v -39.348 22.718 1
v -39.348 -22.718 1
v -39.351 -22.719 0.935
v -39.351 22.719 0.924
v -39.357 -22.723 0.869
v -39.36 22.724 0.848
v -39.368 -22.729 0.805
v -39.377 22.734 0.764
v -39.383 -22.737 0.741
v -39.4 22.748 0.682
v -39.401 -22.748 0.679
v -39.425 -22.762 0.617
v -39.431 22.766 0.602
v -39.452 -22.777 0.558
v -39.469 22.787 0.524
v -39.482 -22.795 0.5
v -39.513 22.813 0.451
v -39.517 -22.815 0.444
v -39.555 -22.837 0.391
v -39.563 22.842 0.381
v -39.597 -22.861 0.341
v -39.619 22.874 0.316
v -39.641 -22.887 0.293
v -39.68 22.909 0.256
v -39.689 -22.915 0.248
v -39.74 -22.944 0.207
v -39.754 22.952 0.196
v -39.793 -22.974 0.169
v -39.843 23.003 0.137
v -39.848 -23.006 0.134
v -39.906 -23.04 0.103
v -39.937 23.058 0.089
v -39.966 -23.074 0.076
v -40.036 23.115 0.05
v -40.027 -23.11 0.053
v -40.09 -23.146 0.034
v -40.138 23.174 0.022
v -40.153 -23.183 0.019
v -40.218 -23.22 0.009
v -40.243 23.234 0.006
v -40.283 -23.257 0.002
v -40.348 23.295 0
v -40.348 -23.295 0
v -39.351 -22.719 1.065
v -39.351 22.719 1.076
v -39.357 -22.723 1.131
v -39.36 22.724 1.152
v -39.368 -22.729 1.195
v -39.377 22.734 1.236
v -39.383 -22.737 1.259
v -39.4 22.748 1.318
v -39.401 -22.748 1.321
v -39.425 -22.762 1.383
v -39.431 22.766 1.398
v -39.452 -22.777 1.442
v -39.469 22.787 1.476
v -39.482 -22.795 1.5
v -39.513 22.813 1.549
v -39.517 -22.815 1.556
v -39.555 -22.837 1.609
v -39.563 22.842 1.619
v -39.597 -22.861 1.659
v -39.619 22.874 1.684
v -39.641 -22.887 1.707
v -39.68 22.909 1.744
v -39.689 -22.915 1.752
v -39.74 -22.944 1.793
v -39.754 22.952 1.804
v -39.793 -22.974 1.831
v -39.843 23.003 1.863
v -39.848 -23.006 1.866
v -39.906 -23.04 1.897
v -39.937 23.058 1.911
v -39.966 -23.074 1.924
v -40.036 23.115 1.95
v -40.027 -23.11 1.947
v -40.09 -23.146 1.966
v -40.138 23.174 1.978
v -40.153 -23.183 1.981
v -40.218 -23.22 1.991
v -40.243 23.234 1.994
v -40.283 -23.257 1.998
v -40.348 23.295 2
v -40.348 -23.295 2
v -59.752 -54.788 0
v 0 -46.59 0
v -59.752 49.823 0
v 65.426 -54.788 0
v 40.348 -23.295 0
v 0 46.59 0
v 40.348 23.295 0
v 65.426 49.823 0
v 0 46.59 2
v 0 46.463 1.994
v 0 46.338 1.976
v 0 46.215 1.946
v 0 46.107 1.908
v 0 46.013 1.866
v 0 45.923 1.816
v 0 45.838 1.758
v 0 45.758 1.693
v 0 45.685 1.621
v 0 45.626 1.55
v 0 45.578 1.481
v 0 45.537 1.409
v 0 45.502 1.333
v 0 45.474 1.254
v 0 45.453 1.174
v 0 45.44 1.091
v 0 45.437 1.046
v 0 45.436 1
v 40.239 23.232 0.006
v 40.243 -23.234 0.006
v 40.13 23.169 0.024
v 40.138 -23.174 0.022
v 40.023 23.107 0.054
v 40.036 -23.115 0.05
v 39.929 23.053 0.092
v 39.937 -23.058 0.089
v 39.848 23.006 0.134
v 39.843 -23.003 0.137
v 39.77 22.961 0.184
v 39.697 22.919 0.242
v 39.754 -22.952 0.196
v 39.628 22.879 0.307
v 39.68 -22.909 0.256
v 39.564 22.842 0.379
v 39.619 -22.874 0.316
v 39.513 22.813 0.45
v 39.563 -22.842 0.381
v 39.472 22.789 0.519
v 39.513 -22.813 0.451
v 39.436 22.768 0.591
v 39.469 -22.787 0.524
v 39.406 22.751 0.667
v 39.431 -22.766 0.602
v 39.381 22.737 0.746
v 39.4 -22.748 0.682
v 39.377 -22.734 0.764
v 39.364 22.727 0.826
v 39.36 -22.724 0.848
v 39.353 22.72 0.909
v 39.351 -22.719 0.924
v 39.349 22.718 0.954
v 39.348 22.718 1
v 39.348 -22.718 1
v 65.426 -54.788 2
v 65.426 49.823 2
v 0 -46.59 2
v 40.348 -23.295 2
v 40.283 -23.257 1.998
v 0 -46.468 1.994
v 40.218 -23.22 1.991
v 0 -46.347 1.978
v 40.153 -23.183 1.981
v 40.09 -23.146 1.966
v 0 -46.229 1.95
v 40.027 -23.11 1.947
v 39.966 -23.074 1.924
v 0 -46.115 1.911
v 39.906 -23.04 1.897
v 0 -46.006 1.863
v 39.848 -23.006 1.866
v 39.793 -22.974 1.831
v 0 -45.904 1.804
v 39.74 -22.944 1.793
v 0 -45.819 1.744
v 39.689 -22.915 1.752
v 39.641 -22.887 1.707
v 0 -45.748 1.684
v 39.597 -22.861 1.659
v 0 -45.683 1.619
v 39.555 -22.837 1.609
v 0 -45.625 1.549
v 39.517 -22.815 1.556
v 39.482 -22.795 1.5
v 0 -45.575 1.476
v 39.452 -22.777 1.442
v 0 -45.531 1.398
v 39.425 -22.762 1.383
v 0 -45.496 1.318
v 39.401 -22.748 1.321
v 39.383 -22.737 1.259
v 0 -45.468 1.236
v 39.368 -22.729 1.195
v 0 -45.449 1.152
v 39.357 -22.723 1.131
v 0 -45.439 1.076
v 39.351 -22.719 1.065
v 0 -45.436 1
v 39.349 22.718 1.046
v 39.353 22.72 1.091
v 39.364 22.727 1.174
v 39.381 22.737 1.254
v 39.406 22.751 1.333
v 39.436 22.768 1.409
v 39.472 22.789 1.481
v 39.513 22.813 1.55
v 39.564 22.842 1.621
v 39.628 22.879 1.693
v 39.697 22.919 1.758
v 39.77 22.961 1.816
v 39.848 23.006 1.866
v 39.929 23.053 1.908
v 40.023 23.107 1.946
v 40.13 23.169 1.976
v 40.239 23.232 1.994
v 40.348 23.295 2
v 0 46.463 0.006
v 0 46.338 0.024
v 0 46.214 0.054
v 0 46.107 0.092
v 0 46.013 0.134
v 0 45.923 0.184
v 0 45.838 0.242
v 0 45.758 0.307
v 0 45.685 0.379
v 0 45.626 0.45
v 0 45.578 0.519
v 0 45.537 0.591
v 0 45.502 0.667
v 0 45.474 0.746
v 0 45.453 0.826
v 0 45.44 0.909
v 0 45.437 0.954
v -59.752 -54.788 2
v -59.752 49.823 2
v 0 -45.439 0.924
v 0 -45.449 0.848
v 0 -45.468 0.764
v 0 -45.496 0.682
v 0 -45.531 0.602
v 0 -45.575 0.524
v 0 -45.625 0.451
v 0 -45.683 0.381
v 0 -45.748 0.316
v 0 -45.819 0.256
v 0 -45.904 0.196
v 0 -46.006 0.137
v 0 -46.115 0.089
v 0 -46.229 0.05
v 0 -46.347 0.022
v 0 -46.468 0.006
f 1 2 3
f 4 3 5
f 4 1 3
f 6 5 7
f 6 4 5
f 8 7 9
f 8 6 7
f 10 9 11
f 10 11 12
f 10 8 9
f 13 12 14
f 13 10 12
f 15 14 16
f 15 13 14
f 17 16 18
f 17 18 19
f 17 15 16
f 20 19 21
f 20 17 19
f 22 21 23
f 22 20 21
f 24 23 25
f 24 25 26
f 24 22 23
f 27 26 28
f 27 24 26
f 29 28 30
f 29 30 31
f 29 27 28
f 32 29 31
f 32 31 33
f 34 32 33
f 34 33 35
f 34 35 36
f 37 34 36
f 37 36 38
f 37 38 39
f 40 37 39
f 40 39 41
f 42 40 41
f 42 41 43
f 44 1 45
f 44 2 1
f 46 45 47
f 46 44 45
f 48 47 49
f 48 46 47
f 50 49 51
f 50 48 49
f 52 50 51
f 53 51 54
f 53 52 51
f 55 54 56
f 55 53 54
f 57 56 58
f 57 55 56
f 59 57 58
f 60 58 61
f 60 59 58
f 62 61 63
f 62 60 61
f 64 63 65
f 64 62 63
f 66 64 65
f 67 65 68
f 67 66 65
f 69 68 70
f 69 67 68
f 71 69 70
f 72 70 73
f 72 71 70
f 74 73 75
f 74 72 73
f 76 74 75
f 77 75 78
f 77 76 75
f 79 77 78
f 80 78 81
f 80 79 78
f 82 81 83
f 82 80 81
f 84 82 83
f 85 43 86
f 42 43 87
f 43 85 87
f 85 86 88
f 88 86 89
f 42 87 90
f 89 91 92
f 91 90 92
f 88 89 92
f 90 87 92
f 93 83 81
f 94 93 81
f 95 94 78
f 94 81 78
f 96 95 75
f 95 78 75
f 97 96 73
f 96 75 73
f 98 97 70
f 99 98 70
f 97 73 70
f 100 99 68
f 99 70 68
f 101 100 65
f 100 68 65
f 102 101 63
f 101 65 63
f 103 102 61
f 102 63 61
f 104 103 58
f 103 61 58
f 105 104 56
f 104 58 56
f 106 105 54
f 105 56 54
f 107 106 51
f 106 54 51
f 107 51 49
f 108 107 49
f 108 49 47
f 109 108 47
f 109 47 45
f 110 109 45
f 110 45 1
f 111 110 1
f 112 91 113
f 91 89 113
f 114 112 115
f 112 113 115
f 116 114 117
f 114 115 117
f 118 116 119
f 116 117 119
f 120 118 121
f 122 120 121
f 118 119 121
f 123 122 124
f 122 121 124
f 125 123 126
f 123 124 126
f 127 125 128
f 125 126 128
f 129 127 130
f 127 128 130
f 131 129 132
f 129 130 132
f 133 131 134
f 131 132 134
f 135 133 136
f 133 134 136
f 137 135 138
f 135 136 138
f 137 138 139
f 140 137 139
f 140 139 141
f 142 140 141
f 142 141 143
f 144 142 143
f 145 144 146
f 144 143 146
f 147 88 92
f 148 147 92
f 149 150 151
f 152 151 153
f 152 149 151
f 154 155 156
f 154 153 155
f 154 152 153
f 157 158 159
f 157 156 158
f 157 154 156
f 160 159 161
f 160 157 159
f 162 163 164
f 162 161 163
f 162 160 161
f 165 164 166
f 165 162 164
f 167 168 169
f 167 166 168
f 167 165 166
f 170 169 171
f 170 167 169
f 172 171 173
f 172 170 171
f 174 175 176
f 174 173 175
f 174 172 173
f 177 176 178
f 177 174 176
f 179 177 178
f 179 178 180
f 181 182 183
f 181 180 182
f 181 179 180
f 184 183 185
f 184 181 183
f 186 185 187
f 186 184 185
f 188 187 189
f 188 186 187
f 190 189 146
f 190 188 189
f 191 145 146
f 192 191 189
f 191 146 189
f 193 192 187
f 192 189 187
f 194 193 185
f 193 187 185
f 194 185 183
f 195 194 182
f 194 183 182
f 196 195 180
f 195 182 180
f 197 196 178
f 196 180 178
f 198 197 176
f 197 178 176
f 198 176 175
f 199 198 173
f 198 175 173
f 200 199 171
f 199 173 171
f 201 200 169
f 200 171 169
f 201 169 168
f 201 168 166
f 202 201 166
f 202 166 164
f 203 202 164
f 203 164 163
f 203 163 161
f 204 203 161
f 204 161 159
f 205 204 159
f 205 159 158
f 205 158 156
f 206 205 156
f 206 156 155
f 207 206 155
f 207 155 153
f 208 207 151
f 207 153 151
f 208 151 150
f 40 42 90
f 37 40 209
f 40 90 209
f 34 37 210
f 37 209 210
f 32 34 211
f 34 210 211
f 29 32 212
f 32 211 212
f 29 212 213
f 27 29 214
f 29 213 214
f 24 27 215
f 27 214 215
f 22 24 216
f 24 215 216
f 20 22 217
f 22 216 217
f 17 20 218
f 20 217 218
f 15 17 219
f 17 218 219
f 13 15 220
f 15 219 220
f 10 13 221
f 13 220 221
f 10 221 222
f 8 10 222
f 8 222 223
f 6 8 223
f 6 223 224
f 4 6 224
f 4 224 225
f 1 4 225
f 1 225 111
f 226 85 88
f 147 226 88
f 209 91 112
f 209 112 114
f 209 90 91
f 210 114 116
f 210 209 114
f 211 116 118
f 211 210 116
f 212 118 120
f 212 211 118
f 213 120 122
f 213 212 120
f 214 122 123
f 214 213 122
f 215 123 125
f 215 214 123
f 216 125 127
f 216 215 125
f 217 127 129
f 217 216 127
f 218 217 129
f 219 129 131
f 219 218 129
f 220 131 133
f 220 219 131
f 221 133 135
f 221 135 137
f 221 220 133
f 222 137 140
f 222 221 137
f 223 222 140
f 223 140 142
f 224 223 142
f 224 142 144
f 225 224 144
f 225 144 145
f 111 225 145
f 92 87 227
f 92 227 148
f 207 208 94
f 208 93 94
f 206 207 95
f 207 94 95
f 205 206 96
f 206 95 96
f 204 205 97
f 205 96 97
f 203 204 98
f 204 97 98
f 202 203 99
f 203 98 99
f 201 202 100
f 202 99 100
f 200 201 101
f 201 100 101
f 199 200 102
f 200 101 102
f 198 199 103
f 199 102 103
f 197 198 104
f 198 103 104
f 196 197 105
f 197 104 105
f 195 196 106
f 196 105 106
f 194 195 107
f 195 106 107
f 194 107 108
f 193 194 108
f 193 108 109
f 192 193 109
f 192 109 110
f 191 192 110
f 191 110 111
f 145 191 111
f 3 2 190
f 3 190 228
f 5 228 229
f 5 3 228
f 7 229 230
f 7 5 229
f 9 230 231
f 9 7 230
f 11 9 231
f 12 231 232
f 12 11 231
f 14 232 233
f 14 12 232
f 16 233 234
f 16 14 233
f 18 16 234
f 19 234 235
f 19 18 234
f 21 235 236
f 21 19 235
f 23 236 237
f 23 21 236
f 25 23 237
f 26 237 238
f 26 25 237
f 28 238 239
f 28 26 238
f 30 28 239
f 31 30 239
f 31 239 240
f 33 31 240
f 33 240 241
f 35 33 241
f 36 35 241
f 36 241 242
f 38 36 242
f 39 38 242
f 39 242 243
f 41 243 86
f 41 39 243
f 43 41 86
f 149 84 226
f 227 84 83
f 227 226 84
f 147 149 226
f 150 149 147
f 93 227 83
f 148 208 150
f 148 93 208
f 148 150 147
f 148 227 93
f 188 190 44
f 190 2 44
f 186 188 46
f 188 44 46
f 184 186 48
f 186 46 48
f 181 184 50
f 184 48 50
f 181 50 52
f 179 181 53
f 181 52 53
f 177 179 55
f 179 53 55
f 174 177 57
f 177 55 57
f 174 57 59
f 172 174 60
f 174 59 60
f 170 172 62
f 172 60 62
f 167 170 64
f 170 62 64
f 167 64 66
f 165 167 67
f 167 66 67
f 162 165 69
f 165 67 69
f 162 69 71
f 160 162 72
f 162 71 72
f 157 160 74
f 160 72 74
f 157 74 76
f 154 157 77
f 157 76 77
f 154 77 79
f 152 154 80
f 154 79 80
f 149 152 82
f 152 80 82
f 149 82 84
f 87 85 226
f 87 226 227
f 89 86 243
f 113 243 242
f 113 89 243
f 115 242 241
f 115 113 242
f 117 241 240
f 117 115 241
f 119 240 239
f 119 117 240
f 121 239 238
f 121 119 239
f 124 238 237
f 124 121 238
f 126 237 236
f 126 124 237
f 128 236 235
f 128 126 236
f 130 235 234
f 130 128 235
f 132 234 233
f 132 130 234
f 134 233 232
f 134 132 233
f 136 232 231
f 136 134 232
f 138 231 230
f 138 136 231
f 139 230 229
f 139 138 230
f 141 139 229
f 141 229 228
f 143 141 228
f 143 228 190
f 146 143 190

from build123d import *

# Parameters (mm, degrees)
F0_W     = 125.1782737672
F0_H     = 104.6107336879
F1_DEPTH = 2
F2_R     = 0.99999
F3_R     = 0.99999
F4_R     = 0.99999
F5_R     = 0.99999
F6_R     = 0.99999
F7_R     = 0.9999


# Not quite as in the source:
# - a fillet or chamfer is up to 0.001 mm smaller than in the source, because OpenCascade refuses the exact size


with BuildPart() as f1:
    # F0 (on Top) → F1 (new body)
    with BuildSketch(Plane.XY):
        with Locations((2.8369072825, -2.482291311)):
            Rectangle(F0_W, F0_H)
        Polygon((39.3484285011, 22.7178257873), (39.3484285011, -22.7178257873), (0, -45.4356515746), (-39.3484285011, -22.7178257873), (-39.3484285011, 22.7178257873), (0, 45.4356515746), align=None, mode=Mode.SUBTRACT)
    extrude(amount=F1_DEPTH)

    # F2 (radius 1 in the source; OpenCascade refuses exactly that, so slightly less here)
    f2_edges = [f1.edges().sort_by_distance(p)[0] for p in [
        (-19.674214, -34.076739, 2),
        (-19.674214, -34.076739, 0),
    ]]
    fillet(f2_edges, radius=F2_R)

    # F3 (radius 1 in the source; OpenCascade refuses exactly that, so slightly less here)
    f3_edges = [f1.edges().sort_by_distance(p)[0] for p in [
        (-39.348429, 0, 2),
        (-39.348429, 0, 0),
    ]]
    fillet(f3_edges, radius=F3_R)

    # F4 (radius 1 in the source; OpenCascade refuses exactly that, so slightly less here)
    f4_edges = [f1.edges().sort_by_distance(p)[0] for p in [
        (19.674214, -34.076739, 2),
        (19.674214, -34.076739, 0),
    ]]
    fillet(f4_edges, radius=F4_R)

    # F5 (radius 1 in the source; OpenCascade refuses exactly that, so slightly less here)
    f5_edges = [f1.edges().sort_by_distance(p)[0] for p in [
        (39.348429, 0, 2),
        (39.348429, 0, 0),
    ]]
    fillet(f5_edges, radius=F5_R)

    # F6 (radius 1 in the source; OpenCascade refuses exactly that, so slightly less here)
    f6_edges = [f1.edges().sort_by_distance(p)[0] for p in [
        (-19.674214, 34.076739, 2),
        (-19.674214, 34.076739, 0),
    ]]
    fillet(f6_edges, radius=F6_R)

    # F7 (radius 1 in the source; OpenCascade refuses exactly that, so slightly less here)
    f7_edges = [f1.edges().sort_by_distance(p)[0] for p in [
        (19.674214, 34.076739, 2),
        (19.674214, 34.076739, 0),
    ]]
    fillet(f7_edges, radius=F7_R)


solid = f1.part
